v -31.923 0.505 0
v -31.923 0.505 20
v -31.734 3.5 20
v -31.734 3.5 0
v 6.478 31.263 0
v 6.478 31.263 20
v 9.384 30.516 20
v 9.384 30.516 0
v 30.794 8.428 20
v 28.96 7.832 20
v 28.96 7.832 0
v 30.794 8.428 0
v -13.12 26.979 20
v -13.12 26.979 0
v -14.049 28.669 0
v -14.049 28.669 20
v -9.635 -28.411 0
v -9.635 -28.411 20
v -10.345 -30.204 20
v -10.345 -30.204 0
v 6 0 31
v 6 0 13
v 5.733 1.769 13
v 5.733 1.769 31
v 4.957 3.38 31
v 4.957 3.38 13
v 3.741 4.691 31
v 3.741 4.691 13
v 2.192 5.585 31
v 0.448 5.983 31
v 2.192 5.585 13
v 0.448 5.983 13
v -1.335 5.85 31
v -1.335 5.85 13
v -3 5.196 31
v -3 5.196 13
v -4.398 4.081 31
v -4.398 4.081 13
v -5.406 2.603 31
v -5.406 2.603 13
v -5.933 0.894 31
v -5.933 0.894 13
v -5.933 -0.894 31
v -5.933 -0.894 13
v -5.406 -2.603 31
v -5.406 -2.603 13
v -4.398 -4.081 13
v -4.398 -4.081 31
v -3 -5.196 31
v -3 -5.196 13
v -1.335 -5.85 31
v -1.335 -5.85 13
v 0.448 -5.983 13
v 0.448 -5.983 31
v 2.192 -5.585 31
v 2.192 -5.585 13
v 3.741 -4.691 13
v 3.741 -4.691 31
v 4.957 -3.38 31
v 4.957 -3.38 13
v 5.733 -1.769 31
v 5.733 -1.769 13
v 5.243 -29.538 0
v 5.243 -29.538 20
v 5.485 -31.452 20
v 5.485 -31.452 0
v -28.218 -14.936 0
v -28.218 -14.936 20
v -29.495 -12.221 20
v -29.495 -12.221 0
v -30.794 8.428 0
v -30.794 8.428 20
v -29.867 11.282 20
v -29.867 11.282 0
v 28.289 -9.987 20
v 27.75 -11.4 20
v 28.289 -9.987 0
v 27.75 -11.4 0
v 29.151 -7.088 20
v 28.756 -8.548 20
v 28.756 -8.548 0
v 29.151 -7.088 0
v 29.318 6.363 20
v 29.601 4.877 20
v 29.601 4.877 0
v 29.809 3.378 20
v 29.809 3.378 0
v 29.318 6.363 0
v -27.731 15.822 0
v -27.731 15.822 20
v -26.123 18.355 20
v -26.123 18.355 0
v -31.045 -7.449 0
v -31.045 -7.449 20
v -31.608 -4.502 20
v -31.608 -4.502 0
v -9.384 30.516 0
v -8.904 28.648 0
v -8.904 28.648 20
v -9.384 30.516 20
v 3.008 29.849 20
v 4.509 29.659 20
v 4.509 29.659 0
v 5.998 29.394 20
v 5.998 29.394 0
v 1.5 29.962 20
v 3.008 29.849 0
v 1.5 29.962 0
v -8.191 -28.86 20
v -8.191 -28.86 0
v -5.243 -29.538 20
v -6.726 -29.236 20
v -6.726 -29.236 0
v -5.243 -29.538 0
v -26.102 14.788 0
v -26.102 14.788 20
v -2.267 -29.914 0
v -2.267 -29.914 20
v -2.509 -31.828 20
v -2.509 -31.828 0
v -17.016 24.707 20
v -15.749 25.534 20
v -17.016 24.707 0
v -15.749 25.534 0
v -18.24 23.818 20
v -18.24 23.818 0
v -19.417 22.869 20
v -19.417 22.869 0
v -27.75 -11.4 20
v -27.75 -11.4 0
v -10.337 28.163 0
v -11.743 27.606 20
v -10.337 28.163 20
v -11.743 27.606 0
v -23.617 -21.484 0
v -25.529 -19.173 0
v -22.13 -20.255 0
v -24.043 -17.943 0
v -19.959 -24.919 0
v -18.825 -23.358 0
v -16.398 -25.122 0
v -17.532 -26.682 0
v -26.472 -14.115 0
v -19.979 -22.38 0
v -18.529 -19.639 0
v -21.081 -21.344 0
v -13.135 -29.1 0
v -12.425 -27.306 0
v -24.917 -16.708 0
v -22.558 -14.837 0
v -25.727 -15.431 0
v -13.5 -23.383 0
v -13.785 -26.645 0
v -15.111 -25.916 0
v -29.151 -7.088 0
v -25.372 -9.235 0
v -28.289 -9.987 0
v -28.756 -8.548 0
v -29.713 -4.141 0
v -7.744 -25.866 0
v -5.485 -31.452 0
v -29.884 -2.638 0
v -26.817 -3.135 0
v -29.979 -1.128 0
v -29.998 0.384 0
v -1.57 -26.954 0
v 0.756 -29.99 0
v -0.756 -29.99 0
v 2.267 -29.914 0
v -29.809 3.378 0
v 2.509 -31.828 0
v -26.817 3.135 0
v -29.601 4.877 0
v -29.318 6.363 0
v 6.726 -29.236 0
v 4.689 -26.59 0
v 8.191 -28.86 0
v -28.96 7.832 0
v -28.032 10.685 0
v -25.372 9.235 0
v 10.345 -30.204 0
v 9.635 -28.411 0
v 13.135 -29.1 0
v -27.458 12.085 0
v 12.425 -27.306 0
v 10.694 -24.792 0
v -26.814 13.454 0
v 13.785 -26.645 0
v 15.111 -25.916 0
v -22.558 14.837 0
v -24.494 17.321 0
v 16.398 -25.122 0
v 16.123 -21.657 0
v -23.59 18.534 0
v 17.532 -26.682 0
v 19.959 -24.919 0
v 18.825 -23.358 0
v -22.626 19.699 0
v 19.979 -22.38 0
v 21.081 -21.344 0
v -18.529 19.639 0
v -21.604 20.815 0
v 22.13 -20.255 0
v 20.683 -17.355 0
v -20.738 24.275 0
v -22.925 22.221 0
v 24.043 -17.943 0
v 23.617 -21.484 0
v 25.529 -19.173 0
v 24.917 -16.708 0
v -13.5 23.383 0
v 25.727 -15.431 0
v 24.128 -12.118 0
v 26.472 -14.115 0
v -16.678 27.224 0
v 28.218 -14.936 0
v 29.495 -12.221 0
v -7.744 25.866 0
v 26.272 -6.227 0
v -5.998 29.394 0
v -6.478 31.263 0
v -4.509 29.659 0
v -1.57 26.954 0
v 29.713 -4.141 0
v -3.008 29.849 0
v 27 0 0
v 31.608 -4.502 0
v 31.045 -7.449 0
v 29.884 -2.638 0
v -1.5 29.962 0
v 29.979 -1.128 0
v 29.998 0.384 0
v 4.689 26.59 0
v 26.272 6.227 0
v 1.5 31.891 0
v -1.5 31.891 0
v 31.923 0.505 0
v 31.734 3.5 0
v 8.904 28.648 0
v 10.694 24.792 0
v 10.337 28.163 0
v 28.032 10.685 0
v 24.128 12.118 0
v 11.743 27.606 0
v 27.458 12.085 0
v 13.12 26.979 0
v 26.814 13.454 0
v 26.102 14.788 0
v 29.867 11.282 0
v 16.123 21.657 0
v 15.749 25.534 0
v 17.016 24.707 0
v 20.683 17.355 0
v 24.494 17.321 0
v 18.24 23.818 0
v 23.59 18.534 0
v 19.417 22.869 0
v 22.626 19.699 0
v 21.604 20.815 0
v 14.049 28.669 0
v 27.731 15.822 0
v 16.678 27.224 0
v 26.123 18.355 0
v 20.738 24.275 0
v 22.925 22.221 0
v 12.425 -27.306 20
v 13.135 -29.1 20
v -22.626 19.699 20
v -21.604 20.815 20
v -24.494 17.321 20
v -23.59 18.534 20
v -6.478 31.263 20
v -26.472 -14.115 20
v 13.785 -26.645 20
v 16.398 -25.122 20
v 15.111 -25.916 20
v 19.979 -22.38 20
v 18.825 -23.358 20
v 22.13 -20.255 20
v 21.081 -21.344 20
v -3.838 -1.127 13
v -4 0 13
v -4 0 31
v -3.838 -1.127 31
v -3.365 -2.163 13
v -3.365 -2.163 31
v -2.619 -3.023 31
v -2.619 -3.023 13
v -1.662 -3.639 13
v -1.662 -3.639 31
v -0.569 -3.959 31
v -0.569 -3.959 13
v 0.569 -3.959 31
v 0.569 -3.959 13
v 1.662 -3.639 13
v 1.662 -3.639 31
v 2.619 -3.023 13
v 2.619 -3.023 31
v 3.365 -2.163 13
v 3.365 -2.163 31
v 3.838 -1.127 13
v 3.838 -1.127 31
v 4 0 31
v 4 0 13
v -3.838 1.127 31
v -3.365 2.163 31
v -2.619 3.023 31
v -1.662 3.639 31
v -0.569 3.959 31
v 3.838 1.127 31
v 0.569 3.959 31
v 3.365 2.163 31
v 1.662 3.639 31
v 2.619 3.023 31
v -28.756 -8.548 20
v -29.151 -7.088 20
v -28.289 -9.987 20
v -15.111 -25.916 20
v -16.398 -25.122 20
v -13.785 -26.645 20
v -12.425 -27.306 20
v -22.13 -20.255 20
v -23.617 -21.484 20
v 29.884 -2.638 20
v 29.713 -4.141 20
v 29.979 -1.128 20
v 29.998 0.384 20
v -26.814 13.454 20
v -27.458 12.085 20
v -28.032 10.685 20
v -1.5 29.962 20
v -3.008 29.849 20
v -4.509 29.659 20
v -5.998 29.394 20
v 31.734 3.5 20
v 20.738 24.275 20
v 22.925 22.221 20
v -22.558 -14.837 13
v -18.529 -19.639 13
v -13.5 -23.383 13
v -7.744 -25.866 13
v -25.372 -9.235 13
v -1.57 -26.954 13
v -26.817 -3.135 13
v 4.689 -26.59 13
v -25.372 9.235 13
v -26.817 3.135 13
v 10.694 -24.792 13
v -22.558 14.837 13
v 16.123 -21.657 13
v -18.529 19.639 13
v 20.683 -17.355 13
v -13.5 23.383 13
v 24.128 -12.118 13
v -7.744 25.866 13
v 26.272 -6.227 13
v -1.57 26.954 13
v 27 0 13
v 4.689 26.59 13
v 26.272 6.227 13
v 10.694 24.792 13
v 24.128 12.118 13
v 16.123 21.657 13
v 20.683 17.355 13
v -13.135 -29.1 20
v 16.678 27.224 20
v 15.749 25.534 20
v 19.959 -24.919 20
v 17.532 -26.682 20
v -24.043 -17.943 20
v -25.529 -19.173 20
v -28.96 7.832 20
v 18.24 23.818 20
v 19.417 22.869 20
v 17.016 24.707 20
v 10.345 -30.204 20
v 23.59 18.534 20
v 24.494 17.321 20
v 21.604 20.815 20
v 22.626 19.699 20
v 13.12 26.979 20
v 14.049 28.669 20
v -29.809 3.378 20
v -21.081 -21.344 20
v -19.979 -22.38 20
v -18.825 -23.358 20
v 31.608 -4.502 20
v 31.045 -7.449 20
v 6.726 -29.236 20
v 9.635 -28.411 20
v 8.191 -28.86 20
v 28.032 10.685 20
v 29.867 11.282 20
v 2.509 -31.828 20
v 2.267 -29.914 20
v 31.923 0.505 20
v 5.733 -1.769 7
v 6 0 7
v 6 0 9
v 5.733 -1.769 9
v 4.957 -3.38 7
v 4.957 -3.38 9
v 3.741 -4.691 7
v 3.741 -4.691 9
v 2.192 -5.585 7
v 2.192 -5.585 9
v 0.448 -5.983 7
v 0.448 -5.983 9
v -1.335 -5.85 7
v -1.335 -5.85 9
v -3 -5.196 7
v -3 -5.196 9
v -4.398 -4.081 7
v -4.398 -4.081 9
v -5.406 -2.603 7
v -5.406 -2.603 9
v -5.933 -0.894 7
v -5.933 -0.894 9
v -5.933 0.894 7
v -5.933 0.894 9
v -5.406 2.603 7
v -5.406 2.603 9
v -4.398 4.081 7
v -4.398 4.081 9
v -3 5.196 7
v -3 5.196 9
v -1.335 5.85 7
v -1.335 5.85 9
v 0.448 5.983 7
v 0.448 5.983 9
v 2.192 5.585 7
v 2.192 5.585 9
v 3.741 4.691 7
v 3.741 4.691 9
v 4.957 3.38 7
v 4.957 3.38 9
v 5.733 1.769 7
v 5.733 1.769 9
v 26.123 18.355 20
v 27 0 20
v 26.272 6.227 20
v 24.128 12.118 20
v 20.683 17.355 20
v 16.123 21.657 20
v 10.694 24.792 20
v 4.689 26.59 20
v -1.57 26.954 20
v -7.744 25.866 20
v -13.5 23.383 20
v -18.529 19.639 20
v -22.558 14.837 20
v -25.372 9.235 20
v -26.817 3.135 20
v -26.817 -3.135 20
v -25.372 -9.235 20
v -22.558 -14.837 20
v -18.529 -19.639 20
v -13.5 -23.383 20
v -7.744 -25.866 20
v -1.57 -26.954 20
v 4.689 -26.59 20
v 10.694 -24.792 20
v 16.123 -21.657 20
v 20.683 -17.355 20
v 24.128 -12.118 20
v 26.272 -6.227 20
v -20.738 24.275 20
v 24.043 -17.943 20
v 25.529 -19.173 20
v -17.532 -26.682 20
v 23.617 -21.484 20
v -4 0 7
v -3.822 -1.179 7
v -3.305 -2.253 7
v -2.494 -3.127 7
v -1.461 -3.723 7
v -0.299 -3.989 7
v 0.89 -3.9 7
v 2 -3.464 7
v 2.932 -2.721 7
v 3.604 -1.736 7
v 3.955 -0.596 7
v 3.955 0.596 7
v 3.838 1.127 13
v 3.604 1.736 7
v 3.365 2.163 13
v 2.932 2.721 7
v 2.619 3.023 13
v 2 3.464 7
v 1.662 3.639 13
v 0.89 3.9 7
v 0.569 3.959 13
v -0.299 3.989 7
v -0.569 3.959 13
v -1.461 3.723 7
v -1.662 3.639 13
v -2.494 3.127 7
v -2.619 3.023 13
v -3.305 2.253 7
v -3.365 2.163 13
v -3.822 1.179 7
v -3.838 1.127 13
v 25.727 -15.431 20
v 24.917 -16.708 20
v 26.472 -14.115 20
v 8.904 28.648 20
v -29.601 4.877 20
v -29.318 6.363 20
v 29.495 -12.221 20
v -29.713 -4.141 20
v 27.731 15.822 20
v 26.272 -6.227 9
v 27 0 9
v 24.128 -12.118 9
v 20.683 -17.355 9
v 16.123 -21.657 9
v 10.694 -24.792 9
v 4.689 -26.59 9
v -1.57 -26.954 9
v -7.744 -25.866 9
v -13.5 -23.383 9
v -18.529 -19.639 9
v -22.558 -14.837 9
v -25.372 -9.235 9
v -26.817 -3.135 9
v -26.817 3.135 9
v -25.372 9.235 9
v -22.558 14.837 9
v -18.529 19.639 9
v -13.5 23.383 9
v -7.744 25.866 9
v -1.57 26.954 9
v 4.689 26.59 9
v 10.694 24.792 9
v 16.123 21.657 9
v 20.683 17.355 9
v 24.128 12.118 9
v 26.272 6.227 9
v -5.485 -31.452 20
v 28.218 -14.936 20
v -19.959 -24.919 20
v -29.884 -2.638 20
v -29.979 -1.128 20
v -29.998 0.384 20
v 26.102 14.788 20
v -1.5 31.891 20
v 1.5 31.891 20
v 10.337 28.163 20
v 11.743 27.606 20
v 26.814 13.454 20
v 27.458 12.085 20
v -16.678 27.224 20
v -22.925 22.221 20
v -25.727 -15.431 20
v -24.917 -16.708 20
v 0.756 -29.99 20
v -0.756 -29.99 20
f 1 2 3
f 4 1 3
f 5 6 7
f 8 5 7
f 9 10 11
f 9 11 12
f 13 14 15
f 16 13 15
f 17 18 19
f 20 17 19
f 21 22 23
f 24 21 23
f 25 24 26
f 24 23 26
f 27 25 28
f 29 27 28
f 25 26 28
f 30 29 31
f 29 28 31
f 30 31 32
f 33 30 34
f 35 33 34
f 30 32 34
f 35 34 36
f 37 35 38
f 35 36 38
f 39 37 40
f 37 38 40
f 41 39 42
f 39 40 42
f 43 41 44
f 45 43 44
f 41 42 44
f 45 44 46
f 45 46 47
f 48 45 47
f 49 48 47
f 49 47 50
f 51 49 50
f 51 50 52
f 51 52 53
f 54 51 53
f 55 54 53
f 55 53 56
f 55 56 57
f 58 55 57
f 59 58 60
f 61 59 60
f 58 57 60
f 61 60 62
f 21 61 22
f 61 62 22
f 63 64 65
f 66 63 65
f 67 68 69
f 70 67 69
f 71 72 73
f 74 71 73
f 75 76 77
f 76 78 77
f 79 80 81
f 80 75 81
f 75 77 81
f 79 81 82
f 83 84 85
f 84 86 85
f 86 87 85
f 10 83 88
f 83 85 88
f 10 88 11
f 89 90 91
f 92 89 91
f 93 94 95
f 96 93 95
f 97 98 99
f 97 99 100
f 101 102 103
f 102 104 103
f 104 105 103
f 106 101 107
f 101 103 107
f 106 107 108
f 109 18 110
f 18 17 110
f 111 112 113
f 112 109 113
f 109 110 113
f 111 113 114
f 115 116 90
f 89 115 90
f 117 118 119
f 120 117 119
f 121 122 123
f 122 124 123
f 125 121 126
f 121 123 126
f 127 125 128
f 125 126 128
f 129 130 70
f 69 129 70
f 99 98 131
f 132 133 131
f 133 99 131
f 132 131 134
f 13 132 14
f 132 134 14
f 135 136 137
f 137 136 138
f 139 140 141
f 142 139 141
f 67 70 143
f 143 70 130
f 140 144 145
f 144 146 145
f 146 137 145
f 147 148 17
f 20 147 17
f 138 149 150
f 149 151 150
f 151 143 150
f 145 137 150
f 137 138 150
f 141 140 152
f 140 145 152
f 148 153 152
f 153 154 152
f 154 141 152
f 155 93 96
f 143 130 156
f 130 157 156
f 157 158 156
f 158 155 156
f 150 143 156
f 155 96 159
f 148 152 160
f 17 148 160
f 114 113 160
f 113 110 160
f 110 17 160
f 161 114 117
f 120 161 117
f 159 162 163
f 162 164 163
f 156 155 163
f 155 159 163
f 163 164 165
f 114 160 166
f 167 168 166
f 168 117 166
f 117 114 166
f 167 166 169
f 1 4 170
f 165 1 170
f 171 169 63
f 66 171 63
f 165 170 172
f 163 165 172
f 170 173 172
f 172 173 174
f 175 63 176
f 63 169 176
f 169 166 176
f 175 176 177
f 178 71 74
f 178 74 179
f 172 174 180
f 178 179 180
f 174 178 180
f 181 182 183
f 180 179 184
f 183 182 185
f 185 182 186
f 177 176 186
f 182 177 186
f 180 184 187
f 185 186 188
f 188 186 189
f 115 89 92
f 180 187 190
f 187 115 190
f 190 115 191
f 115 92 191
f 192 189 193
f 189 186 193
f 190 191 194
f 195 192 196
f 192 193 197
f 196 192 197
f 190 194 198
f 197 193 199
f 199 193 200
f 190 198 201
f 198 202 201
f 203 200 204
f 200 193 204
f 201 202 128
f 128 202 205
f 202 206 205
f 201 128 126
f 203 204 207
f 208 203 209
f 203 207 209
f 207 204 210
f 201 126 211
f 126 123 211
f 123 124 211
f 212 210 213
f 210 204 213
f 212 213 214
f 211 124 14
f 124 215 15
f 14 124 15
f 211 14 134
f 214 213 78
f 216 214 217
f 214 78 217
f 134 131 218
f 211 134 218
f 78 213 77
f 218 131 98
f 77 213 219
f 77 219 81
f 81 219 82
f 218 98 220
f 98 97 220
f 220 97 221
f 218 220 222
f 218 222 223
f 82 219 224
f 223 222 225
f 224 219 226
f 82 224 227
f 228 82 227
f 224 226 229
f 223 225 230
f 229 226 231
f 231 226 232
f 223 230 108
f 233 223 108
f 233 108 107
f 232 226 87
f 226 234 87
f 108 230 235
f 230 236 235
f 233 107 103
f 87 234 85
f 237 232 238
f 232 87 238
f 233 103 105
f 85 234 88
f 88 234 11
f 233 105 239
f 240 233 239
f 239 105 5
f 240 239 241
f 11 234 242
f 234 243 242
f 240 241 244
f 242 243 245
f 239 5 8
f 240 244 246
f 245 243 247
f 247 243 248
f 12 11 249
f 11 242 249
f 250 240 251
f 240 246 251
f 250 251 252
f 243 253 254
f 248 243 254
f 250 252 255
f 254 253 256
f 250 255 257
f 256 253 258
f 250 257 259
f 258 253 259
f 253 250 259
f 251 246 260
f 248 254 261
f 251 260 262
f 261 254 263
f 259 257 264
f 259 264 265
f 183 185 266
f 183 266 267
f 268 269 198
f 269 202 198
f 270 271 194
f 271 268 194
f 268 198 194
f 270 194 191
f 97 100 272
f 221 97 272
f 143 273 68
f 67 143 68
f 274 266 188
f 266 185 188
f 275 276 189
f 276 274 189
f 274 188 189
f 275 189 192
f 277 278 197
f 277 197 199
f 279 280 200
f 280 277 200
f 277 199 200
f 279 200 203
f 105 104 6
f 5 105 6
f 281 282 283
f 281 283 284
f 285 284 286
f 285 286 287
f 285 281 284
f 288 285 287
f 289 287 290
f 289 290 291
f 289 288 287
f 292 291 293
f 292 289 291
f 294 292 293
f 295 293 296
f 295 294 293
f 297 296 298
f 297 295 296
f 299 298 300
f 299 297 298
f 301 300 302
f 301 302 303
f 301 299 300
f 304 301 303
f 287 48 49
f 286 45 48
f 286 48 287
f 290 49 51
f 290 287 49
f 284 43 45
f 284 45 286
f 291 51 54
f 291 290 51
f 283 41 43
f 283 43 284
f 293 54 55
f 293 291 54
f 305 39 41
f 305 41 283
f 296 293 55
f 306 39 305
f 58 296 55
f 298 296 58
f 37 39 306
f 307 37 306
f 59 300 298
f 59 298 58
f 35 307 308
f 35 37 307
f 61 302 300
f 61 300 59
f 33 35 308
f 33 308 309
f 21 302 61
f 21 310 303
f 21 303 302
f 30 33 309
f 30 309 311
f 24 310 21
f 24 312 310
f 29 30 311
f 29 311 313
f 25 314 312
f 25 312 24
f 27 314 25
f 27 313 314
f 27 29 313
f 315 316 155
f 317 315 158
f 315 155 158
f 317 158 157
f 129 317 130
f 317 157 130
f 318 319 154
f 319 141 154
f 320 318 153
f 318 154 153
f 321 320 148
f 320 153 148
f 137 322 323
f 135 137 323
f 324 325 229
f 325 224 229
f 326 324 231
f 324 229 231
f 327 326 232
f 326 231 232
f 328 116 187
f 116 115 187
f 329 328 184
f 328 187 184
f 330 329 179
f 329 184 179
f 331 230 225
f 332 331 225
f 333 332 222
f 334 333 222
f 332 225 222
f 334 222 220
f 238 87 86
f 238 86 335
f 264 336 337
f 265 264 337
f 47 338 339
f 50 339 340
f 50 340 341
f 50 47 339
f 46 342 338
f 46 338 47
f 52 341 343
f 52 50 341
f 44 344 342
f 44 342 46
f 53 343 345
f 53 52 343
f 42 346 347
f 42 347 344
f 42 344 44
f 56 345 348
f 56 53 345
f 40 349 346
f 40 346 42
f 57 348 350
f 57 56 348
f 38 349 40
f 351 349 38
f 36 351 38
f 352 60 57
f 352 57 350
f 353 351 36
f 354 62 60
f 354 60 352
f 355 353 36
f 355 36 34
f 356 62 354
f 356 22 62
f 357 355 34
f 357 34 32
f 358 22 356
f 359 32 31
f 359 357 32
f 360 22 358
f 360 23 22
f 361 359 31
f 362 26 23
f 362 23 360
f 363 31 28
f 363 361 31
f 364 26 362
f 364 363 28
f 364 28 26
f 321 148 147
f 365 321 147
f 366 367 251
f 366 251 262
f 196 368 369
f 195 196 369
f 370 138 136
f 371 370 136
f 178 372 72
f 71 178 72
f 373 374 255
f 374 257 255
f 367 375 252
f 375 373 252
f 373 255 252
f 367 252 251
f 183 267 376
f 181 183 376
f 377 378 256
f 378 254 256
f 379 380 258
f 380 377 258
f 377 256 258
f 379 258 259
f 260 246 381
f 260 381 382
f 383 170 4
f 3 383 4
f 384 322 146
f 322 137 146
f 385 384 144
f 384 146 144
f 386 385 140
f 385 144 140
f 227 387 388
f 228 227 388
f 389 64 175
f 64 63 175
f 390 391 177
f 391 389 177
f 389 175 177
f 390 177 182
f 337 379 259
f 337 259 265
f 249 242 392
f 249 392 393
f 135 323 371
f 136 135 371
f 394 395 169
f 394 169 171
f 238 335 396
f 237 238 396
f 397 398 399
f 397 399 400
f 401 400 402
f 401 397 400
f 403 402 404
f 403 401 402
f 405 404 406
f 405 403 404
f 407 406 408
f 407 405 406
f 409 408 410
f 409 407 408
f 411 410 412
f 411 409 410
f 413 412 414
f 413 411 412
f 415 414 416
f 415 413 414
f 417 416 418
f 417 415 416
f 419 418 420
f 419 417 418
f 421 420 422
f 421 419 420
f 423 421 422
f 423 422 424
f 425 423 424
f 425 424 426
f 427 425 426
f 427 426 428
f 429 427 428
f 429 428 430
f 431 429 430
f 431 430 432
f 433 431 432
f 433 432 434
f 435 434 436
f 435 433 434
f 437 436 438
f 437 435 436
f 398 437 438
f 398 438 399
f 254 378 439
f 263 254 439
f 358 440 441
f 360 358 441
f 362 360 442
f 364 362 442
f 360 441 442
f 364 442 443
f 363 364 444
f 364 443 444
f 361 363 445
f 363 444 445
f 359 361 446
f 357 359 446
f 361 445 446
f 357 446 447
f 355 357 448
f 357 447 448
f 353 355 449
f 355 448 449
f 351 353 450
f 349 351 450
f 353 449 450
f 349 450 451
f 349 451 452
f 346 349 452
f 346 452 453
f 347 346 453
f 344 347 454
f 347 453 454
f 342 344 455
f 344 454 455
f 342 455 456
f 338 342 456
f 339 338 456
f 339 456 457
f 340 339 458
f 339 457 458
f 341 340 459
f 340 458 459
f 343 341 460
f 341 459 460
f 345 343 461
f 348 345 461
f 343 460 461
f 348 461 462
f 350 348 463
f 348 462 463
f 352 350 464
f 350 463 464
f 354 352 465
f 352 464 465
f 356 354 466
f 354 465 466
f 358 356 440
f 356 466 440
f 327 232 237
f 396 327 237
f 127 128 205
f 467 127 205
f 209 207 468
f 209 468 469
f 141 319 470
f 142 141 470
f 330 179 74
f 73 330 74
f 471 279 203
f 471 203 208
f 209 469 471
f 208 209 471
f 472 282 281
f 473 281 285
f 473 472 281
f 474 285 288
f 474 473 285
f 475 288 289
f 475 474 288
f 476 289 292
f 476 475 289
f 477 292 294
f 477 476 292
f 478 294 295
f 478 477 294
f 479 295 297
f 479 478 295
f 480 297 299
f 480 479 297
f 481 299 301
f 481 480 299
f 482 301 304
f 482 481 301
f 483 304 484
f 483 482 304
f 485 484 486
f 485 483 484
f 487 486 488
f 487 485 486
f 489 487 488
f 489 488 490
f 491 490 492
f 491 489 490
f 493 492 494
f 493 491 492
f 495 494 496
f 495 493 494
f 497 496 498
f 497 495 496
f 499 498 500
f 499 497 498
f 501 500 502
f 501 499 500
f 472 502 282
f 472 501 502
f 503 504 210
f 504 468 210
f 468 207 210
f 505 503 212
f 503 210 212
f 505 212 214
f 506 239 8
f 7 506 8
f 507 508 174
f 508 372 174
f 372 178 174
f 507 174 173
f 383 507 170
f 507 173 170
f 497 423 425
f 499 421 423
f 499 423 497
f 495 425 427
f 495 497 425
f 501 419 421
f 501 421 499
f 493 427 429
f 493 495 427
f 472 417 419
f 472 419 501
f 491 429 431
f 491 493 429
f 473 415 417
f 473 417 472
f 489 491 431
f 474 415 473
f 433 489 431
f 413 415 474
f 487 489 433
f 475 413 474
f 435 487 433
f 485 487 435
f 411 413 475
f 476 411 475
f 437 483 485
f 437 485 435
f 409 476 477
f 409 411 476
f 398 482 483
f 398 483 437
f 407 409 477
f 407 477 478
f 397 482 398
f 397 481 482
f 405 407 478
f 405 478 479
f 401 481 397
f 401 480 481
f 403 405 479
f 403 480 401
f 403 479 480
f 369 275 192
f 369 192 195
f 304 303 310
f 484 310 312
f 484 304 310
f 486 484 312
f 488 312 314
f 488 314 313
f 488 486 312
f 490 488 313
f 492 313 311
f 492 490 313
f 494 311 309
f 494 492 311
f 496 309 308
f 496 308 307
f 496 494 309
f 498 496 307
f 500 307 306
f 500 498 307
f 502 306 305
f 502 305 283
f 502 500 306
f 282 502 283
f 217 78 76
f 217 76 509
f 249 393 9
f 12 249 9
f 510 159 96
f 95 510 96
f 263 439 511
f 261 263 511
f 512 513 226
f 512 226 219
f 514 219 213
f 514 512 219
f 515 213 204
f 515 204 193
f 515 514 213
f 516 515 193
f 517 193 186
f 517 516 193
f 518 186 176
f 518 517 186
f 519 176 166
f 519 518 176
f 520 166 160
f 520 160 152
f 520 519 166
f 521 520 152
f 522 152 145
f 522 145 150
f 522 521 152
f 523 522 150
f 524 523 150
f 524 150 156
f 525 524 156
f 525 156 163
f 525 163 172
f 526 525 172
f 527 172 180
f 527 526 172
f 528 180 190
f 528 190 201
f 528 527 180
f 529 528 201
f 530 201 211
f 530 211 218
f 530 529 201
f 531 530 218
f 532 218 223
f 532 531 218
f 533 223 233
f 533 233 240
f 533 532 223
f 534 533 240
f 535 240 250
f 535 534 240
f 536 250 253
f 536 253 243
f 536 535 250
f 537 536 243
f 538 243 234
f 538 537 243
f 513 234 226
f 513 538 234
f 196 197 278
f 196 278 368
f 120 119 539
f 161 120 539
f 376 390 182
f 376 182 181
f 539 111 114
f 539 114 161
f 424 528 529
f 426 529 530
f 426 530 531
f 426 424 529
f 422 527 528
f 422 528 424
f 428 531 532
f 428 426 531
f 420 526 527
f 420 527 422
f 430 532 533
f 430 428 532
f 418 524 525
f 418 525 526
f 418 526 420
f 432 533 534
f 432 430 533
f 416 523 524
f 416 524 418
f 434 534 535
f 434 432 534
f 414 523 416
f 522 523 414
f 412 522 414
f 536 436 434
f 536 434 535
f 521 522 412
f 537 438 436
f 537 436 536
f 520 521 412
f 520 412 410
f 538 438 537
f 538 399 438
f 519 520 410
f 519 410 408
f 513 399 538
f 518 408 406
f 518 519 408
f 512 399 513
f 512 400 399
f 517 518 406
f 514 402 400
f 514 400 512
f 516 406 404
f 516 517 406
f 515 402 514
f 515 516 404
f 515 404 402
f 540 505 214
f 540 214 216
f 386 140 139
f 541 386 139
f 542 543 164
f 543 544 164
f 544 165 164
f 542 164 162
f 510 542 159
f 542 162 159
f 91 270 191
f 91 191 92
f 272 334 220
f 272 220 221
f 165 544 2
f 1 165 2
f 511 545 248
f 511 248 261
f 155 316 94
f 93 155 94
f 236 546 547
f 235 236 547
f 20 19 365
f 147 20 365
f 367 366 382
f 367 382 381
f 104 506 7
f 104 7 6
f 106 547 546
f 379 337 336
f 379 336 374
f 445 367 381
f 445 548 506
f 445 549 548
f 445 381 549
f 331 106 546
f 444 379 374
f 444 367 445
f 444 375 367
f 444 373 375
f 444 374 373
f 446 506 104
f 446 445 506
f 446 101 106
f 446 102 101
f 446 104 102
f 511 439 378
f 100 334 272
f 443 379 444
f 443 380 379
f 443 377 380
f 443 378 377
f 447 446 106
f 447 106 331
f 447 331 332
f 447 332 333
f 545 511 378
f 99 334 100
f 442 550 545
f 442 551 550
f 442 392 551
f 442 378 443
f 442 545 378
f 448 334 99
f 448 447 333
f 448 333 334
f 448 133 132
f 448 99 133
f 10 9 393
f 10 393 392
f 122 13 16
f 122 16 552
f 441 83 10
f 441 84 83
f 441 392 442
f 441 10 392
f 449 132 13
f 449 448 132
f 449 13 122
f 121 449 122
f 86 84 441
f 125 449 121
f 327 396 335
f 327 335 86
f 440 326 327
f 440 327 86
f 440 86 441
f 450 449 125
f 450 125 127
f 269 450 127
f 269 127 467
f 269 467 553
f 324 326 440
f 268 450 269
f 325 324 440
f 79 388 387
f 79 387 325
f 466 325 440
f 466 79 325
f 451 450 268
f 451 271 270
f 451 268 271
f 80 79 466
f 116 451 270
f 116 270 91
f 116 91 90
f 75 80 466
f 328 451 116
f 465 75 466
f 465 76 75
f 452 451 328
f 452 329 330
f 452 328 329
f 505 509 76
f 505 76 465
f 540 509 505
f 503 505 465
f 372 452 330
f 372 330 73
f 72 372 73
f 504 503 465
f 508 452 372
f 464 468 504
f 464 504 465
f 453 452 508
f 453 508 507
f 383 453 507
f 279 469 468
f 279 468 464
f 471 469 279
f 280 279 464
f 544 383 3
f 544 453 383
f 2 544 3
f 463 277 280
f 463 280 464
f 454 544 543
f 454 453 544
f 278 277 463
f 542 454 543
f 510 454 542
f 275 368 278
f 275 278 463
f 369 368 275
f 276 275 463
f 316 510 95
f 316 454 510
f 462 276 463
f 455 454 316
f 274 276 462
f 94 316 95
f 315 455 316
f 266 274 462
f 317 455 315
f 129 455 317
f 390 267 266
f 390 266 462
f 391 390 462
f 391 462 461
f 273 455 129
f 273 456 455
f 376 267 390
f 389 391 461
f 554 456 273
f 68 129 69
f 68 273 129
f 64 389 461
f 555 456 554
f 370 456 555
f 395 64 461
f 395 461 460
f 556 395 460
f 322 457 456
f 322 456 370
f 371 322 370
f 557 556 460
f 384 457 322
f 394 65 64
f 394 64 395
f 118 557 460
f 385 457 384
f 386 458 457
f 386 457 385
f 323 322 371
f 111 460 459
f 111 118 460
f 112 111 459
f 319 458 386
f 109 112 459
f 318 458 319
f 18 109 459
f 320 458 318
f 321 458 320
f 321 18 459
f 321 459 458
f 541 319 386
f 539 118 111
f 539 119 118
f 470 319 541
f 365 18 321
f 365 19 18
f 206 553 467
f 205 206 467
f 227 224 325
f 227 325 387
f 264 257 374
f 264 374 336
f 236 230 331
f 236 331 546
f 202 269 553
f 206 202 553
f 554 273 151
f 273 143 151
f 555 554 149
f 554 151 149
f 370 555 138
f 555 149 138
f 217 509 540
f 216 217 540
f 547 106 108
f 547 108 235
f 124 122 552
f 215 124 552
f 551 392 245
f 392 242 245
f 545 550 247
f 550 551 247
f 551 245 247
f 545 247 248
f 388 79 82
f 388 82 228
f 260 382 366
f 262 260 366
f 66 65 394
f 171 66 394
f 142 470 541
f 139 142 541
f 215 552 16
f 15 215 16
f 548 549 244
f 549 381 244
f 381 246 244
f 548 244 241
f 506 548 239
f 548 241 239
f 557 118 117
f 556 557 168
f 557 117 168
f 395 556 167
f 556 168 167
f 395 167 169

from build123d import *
from build123d.topology import SkipClean

# Parameters (mm, degrees)
SKETCH1_R           = 30
BOSS_EXTRUDE1_DEPTH = 20
SKETCH2_R           = 27
CUT_EXTRUDE1_DEPTH  = 7
CUT_EXTRUDE2_START  = -9
SKETCH3_R           = 27
CUT_EXTRUDE2_DEPTH  = 9
SKETCH4_R           = 6
SKETCH4_R_2         = 4
BOSS_EXTRUDE2_DEPTH = 18
BOSS_EXTRUDE3_START = 2
SKETCH5_R           = 6
BOSS_EXTRUDE3_DEPTH = 2
CUT_EXTRUDE7_START  = -42
SKETCH6_R           = 4
CUT_EXTRUDE7_DEPTH  = 42
SKETCH7_W           = 3
SKETCH7_H           = 2
BOSS_EXTRUDE4_DEPTH = 20
CIRPATTERN1_COUNT   = 25


with BuildPart() as part:
    # Sketch1 → Boss-Extrude1 (new body)
    with BuildSketch(Plane.XY):
        Circle(SKETCH1_R)
    extrude(amount=BOSS_EXTRUDE1_DEPTH)

    # Sketch2 → Cut-Extrude1 (cut)
    with BuildSketch(Plane.XY.offset(20)):
        Circle(SKETCH2_R)
    extrude(amount=-CUT_EXTRUDE1_DEPTH, mode=Mode.SUBTRACT)

    # Sketch3 → Cut-Extrude2 (cut)
    with BuildSketch(Plane(origin=(0, 0, 0), x_dir=(-1, 0, 0), z_dir=(0, 0, -1)).offset(CUT_EXTRUDE2_START)):
        with Locations(Location((0, 0, 0), (0, 0, 180))):
            Circle(SKETCH3_R)
    extrude(amount=CUT_EXTRUDE2_DEPTH, mode=Mode.SUBTRACT)

    # Sketch4 → Boss-Extrude2 (add)
    with BuildSketch(Plane.XY.offset(13)):
        Circle(SKETCH4_R)
        Circle(SKETCH4_R_2, mode=Mode.SUBTRACT)
    extrude(amount=BOSS_EXTRUDE2_DEPTH)

    # Sketch5 → Boss-Extrude3 (add)
    with BuildSketch(Plane(origin=(0, 0, 9), x_dir=(-1, 0, 0), z_dir=(0, 0, -1)).offset(BOSS_EXTRUDE3_START)):
        with Locations(Location((0, 0, 0), (0, 0, 180))):
            Circle(SKETCH5_R)
    extrude(amount=-BOSS_EXTRUDE3_DEPTH)

    # Sketch6 → Cut-Extrude7 (cut)
    with SkipClean():  # the faces are left unmerged after this step: merging them gives an invalid solid
        with BuildSketch(Plane.XY.offset(31).offset(CUT_EXTRUDE7_START)):
            with Locations(Location((0, 0, 0), (0, 0, 180))):
                Circle(SKETCH6_R)
        extrude(amount=CUT_EXTRUDE7_DEPTH, mode=Mode.SUBTRACT)
    add(part.part.scale(1), mode=Mode.REPLACE)  # the faces are merged on a copy

    # Sketch7 → Boss-Extrude4 (add)
    with BuildSketch(Plane.XY.offset(20)):
        with Locations((0, 30.891402014)):
            Rectangle(SKETCH7_W, SKETCH7_H)
    boss_extrude4 = extrude(amount=-BOSS_EXTRUDE4_DEPTH)

    # CirPattern1: Boss-Extrude4 ×25 about axis
    cirpattern1_axis = Axis((0, 0, 0), (0, 0, 1))
    for i in range(1, CIRPATTERN1_COUNT):
        add(boss_extrude4.rotate(cirpattern1_axis, i * 360 / CIRPATTERN1_COUNT))


solid = part.part
